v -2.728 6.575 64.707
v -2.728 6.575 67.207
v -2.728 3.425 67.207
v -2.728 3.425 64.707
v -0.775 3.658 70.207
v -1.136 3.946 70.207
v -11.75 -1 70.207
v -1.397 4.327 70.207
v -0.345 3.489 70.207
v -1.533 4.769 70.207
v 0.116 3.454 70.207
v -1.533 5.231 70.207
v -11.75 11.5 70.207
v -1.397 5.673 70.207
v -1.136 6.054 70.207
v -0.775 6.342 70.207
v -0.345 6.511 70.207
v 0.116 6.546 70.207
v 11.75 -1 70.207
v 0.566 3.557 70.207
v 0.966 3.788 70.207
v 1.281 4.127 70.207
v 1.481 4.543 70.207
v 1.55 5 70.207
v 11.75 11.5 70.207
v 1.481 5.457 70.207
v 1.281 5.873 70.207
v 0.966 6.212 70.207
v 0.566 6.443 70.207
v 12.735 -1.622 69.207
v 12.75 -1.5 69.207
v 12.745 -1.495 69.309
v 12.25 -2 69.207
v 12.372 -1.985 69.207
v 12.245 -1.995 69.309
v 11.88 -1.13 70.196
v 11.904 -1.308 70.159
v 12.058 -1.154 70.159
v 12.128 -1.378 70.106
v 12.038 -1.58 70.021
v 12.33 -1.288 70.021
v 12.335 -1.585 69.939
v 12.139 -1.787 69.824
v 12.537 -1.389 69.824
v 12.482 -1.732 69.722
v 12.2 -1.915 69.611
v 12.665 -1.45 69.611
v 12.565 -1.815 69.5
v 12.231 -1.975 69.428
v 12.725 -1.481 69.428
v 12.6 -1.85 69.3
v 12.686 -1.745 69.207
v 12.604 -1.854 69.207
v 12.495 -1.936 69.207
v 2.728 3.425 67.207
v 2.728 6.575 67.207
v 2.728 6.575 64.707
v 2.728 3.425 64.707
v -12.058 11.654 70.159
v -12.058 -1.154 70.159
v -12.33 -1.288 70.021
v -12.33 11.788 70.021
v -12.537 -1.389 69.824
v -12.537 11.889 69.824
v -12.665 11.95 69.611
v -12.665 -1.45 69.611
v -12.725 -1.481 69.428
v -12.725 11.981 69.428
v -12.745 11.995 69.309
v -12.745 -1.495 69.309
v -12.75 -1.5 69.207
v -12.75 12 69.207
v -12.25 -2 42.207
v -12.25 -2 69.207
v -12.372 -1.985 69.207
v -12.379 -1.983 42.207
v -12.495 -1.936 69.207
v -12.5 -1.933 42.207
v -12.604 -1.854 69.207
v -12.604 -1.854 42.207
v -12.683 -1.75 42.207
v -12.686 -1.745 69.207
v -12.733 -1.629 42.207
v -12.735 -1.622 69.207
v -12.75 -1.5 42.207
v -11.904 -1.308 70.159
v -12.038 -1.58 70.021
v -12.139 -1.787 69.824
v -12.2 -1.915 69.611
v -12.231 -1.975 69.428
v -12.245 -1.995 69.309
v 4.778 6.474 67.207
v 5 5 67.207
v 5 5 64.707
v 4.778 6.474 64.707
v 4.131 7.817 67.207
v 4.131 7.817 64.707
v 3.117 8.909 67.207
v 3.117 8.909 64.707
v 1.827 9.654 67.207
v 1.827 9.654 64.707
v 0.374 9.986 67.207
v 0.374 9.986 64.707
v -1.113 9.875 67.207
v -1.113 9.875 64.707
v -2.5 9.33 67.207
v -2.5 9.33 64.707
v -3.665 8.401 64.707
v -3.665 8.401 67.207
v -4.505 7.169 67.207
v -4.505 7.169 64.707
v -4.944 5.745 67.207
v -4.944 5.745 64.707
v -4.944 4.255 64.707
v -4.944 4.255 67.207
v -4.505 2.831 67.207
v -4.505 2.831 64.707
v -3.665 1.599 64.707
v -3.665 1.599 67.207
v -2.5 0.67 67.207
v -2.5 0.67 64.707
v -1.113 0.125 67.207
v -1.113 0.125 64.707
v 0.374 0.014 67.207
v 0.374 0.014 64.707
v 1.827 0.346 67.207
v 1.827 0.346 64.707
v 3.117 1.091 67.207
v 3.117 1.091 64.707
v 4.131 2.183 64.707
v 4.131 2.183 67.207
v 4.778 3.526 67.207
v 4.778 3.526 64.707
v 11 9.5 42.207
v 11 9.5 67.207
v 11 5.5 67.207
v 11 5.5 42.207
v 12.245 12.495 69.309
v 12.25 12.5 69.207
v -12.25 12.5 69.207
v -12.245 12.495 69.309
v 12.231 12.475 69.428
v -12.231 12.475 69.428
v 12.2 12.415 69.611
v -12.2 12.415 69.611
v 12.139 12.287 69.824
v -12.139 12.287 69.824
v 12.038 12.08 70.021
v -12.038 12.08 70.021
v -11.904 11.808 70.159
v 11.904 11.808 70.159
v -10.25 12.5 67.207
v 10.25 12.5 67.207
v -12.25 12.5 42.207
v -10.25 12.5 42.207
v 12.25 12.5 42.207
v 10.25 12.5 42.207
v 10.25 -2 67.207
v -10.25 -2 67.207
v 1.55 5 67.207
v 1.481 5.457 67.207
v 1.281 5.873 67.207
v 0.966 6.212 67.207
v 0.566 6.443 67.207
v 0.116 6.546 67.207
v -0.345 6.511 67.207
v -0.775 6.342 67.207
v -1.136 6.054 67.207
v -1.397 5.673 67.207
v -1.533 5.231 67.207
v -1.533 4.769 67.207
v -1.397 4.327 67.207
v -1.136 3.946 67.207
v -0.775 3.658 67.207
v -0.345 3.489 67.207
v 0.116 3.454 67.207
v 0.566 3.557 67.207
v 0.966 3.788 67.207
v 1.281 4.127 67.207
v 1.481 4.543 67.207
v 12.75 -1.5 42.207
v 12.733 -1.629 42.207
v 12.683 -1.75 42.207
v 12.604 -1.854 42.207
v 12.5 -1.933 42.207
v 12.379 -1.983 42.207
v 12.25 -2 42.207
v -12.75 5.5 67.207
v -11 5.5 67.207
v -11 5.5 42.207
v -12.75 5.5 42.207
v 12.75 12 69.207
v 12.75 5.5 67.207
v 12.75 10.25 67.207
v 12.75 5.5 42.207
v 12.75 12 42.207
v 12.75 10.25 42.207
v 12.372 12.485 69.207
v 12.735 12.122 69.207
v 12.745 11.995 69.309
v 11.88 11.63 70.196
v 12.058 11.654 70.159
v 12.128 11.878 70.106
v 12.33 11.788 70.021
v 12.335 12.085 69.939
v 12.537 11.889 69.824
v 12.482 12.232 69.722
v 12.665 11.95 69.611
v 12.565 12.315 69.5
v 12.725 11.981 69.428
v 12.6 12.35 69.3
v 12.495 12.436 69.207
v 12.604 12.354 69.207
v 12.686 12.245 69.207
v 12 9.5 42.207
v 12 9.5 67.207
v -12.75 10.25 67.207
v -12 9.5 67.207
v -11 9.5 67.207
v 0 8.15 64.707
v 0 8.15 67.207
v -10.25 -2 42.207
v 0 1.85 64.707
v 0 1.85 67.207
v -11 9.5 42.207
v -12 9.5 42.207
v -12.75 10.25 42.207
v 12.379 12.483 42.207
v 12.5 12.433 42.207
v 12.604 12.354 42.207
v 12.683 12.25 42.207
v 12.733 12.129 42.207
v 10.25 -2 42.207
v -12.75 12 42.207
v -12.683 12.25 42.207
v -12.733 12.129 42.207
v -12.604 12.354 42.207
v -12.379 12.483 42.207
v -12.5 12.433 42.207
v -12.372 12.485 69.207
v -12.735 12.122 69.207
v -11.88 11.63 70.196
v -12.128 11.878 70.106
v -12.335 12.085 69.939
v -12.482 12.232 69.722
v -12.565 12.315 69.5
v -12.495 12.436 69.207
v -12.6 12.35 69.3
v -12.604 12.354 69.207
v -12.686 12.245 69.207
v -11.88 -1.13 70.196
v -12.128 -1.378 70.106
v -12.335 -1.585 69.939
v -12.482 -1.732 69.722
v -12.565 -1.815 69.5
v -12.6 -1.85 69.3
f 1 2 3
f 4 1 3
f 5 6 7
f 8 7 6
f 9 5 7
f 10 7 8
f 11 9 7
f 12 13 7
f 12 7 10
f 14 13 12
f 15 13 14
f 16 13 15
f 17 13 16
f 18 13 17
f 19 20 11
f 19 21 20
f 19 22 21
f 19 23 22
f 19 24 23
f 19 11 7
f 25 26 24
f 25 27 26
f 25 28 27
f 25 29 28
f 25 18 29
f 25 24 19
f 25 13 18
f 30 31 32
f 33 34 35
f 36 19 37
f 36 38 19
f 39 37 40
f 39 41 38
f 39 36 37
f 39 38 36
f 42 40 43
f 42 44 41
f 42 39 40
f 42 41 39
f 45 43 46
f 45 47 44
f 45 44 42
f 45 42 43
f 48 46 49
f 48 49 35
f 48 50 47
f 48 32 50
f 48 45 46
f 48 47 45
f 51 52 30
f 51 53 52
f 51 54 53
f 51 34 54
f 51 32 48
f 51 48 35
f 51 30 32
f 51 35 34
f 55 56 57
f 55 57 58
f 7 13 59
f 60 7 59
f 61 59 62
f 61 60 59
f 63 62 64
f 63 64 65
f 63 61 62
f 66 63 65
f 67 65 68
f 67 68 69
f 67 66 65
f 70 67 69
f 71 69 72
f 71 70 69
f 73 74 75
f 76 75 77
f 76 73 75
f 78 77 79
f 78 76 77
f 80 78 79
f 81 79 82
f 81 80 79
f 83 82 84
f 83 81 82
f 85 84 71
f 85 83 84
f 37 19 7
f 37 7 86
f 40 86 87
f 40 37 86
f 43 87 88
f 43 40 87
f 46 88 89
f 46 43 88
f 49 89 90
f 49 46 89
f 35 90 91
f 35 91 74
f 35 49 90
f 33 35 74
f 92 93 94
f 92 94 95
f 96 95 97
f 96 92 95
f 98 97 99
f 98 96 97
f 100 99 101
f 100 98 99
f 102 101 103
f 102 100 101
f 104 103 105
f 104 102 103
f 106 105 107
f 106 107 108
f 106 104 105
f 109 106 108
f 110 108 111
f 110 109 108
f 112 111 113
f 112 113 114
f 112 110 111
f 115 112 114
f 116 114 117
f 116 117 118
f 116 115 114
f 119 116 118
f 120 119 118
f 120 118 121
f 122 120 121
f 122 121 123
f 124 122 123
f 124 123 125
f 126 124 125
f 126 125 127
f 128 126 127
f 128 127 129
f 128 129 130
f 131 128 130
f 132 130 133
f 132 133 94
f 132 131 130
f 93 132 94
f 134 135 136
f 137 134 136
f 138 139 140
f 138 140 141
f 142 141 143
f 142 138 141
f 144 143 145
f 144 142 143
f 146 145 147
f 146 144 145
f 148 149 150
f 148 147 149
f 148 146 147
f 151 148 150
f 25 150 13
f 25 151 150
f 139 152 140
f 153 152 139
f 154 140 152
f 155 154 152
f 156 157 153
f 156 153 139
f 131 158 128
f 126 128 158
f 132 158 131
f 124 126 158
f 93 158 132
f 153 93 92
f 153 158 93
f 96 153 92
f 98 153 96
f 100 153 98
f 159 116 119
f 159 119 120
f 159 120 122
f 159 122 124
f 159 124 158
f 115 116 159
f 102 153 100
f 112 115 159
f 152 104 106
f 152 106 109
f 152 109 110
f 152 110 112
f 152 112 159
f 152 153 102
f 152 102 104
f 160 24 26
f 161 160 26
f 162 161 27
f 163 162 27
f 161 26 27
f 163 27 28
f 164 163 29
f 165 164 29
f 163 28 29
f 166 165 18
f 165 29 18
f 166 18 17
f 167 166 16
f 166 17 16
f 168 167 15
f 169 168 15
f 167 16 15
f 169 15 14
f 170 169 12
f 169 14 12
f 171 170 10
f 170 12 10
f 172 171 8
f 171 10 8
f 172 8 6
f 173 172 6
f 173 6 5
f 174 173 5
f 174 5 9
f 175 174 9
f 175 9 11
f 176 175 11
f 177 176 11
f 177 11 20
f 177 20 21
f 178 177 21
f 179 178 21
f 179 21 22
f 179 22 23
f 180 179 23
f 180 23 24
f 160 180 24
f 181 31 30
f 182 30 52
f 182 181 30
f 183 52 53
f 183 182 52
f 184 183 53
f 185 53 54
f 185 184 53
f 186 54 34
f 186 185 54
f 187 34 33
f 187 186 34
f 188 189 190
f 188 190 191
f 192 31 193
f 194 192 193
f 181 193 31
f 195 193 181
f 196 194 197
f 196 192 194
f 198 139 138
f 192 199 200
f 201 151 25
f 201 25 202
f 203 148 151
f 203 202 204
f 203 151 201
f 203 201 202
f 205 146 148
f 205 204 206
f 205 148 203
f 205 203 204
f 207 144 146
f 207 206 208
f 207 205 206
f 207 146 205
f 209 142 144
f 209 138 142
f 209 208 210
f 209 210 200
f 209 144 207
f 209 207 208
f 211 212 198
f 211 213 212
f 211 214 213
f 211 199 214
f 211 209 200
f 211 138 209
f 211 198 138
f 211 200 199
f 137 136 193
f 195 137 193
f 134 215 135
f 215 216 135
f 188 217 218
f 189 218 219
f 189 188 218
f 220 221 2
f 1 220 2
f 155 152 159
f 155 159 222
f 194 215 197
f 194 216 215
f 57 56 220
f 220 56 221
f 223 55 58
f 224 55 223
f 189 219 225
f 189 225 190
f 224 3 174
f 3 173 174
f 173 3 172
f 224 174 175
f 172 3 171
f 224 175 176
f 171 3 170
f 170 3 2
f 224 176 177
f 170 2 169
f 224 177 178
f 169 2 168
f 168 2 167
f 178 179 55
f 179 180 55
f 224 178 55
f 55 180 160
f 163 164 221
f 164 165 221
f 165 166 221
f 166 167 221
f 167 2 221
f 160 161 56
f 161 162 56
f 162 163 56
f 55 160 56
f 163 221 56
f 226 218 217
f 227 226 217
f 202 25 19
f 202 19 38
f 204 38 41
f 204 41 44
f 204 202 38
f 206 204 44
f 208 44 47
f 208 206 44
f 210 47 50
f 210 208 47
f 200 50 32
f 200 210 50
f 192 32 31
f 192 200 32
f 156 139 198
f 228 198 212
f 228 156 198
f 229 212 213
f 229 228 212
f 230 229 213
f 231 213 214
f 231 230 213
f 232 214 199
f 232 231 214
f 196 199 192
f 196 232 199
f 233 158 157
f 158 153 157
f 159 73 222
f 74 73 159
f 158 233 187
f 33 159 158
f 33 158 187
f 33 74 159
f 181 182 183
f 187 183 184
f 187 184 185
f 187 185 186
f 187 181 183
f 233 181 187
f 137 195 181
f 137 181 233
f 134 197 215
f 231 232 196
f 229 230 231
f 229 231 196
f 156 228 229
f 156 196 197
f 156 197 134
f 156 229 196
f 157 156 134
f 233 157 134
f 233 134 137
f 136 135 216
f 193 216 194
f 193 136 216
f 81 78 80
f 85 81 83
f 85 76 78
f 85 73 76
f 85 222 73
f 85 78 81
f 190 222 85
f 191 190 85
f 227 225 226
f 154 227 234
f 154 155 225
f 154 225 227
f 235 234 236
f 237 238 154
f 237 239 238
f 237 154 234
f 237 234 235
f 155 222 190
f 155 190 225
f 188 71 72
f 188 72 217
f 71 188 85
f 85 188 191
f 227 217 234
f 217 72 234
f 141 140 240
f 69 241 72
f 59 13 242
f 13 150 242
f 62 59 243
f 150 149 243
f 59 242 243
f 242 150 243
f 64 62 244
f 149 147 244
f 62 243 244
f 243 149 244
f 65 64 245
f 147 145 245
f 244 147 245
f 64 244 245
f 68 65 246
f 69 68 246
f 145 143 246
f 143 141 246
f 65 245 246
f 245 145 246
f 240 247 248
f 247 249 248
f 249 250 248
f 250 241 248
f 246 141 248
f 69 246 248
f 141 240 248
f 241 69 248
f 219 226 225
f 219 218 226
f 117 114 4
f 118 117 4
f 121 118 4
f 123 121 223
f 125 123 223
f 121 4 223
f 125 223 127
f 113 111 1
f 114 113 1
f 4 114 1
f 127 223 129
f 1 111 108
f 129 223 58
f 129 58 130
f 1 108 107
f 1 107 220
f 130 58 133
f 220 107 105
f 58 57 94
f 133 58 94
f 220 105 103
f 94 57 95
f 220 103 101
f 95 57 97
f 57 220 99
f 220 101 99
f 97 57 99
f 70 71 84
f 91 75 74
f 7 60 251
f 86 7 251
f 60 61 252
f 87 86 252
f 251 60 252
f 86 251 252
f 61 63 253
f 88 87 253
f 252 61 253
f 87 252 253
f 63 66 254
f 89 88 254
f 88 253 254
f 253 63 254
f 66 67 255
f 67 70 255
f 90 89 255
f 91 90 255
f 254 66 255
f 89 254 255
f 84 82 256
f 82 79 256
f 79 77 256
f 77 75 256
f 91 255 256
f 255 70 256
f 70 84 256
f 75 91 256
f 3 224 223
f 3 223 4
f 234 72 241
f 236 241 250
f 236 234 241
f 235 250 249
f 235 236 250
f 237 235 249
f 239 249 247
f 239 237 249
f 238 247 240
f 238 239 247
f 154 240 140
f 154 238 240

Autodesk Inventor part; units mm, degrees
ref_plane "YZ Plane" through (0, 0, 0) normal (1, 0, 0) x (0, 1, 0)
ref_plane "XZ Plane" through (0, 0, 0) normal (0, 1, 0) x (-1, 0, 0)
ref_plane "XY Plane" through (0, 0, 0) normal (0, 0, 1) x (1, 0, 0)
sketch "Эскиз1" plane through (0, 0, 0) normal (0, 1, 0) x (-1, 0, 0)
  line L0 (0, 56.6418) -> (23.7825, 76.5969) construction
  line L1 (44.1942, 76.014) -> (76.014, 44.1942) construction
  line L2 (91.1, 52.2091) -> (52.2091, 91.1) construction
  line L3 (0, 0) -> (74.2462, 74.2462) construction
  arc A0 (92.5543, 49.5852) -> (48.7014, 93.0224) centre (0, 0) ccw construction
  line L4 (52.2091, 91.1) -> (48.6736, 87.5645) construction
  arc A1 (44.1942, 83.085) -> (44.1942, 76.014) centre (47.7297, 79.5495) ccw construction
  line L5 (52.2091, 91.1) -> (48.6736, 87.5645) construction
  line L6 (48.6736, 87.5645) -> (52.2091, 91.1) construction
  spline S0 degree 2 poles (48.6736, 87.5645) (52.2091, 91.1) (48.7014, 93.0224) knots 1 1 1 2 2 2 construction
  line L7 (52.2091, 91.1) -> (48.7014, 93.0224) construction
  line L8 (52.2091, 91.1) -> (48.7014, 93.0224) construction
  arc A2 (48.7014, 93.0224) -> (44.0271, 95.3237) centre (0, 0) ccw construction
  arc A3 (44.0271, 95.3237) -> (43.577, 95.5303) centre (0, 0) ccw construction
  line L9 (42.6652, 95.941) -> (43.577, 95.5303) construction
  line L10 (42.6652, 95.941) -> (43.577, 95.5303) construction
  spline S1 degree 2 poles (42.0492, 94.5734) (42.6652, 95.941) (43.577, 95.5303) knots 1 1 1 2 2 2 construction
  line L11 (42.0492, 94.5734) -> (42.6652, 95.941) construction
  line L12 (42.6652, 95.941) -> (42.0492, 94.5734) construction
  line L13 (0, 0) -> (0, 209.8821) construction
  spline S2 degree 2 poles (-48.6736, 87.5645) (-52.2091, 91.1) (-48.7014, 93.0224) knots 1 1 1 2 2 2 construction
  line L14 (-48.6736, 87.5645) -> (-52.2091, 91.1) construction
  line L15 (-52.2091, 91.1) -> (-48.7014, 93.0224) construction
  arc A4 (-44.1942, 76.014) -> (-44.1942, 83.085) centre (-47.7297, 79.5495) ccw construction
  line L16 (-44.1942, 76.014) -> (-76.014, 44.1942) construction
  arc A5 (-48.7014, 93.0224) -> (-92.5543, 49.5852) centre (0, 0) ccw construction
  arc A6 (-83.085, 44.1942) -> (-76.014, 44.1942) centre (-79.5495, 47.7297) ccw construction
  line L17 (-83.085, 44.1942) -> (-87.3563, 48.4654) construction
  spline S3 degree 2 poles (-48.6736, -87.5645) (-52.2091, -91.1) (-48.7014, -93.0224) knots 1 1 1 2 2 2 construction
  line L18 (-48.6736, -87.5645) -> (-52.2091, -91.1) construction
  line L19 (-52.2091, -91.1) -> (-48.7014, -93.0224) construction
  circle A7 centre (0, 0) radius 35 construction
  line L20 (-46.3155, -73.8927) -> (-73.8927, -46.3155) construction
  arc A8 (-73.8927, -46.3155) -> (-85.2064, -46.3155) centre (-79.5495, -51.9723) ccw construction
  line L21 (-85.2064, -46.3155) -> (-87.5645, -48.6736) construction
  line L22 (-87.5645, -48.6736) -> (-91.1, -52.2091) construction
  spline S4 degree 2 poles (-87.5645, -48.6736) (-91.1, -52.2091) (-92.5543, -49.5852) knots 1 1 1 2 2 2 construction
  line L23 (-91.1, -52.2091) -> (-92.5543, -49.5852) construction
  arc A9 (-92.5543, -49.5852) -> (-48.7014, -93.0224) centre (0, 0) ccw construction
  arc A10 (-92.5543, 49.5852) -> (-92.5543, -49.5852) centre (0, 0) ccw construction
  line L24 (48.6736, -87.5645) -> (46.3155, -85.2064) construction
  arc A11 (-46.3155, -85.2064) -> (-46.3155, -73.8927) centre (-51.9723, -79.5495) ccw construction
  line L25 (-48.6736, -87.5645) -> (-46.3155, -85.2064) construction
  arc A12 (-48.7014, -93.0224) -> (48.7014, -93.0224) centre (0, 0) ccw construction
  arc A13 (46.3155, -73.8927) -> (46.3155, -85.2064) centre (51.9723, -79.5495) ccw construction
  arc A14 (43.577, 95.5303) -> (-43.577, 95.5303) centre (0, 0) ccw construction
  arc A15 (23.7825, 76.5969) -> (0, 67.941) centre (0, 104.941) ccw construction
  line L26 (0, 56.6418) -> (-35.5516, 86.4744) construction
  line L27 (44.0271, 95.3237) -> (44.0271, 127.8162) construction
  ellipse E0 centre (0, 102.7511) end of major axis (44.0271, 102.7511) minor radius 27.5932 (42.0492, 94.5734) -> (35.2734, 86.2384) ccw construction
  line L28 (42.6652, 95.941) -> (-42.6652, 95.941) construction
  ellipse E1 centre (0, 102.7511) end of major axis (44.5159, 105.2445) minor radius 28.887 (35.2734, 86.2384) -> (42.0492, 94.5734) ccw construction
  line L29 (23.7825, 76.5969) -> (35.2734, 86.2384) construction
  arc A16 (0, 67.941) -> (23.7825, 76.5969) centre (0, 104.941) ccw construction
  arc A17 (-23.7825, 76.5969) -> (0, 67.941) centre (0, 104.941) ccw construction
  line L30 (-23.7825, 76.5969) -> (-35.2734, 86.2384) construction
  line L31 (-42.6652, 95.941) -> (-42.0492, 94.5734) construction
  arc A18 (-43.577, 95.5303) -> (-48.7014, 93.0224) centre (0, 0) ccw construction
  line L32 (-42.6652, 95.941) -> (-43.577, 95.5303) construction
  spline S5 degree 2 poles (-42.0492, 94.5734) (-42.6652, 95.941) (-43.577, 95.5303) knots 1 1 1 2 2 2 construction
  line L33 (-42.0492, 94.5734) -> (-42.6652, 95.941) construction
  line L34 (-42.6652, 95.941) -> (-43.577, 95.5303) construction
  line L35 (-42.6652, 95.941) -> (-43.577, 95.5303) construction
  spline S6 degree 2 poles (-42.0492, 94.5734) (-42.6652, 95.941) (-43.577, 95.5303) knots 1 1 1 2 2 2 construction
  line L36 (-42.0492, 94.5734) -> (-42.6652, 95.941) construction
  ellipse E2 centre (0, 102.7511) end of major axis (-44.5159, 105.2445) minor radius 28.887 (-42.0492, 94.5734) -> (-35.2734, 86.2384) ccw construction
  line L37 (83.085, 44.1942) -> (87.5645, 48.6736) construction
  arc A19 (76.014, 44.1942) -> (83.085, 44.1942) centre (79.5495, 47.7297) ccw construction
  spline S7 degree 2 poles (48.6736, -87.5645) (52.2091, -91.1) (48.7014, -93.0224) knots 1 1 1 2 2 2 construction
  line L38 (48.6736, -87.5645) -> (52.2091, -91.1) construction
  line L39 (52.2091, -91.1) -> (48.7014, -93.0224) construction
  line L40 (46.3155, -73.8927) -> (73.8927, -46.3155) construction
  arc A20 (85.2064, -46.3155) -> (73.8927, -46.3155) centre (79.5495, -51.9723) ccw construction
  line L41 (85.2064, -46.3155) -> (87.5645, -48.6736) construction
  spline S8 degree 2 poles (87.5645, -48.6736) (91.1, -52.2091) (92.5543, -49.5852) knots 1 1 1 2 2 2 construction
  line L42 (87.5645, -48.6736) -> (91.1, -52.2091) construction
  line L43 (91.1, -52.2091) -> (92.5543, -49.5852) construction
  arc A21 (92.5543, -49.5852) -> (92.5543, 49.5852) centre (0, 0) ccw construction
  arc A22 (48.7014, -93.0224) -> (92.5543, -49.5852) centre (0, 0) ccw construction
  arc A23 (28.5452, 71.4571) -> (-28.5452, 71.4571) centre (0, 104.941) ccw construction
  line L44 (-83.085, 34.2947) -> (-90.6891, 41.8987) construction
  line L45 (-93.5297, 47.6709) -> (-92.5543, 49.5852) construction
  line L46 (-29.1816, 81.127) -> (-76.014, 34.2947) construction
  arc A24 (-83.085, 34.2947) -> (-76.014, 34.2947) centre (-79.5495, 37.8302) ccw construction
  line L47 (-34.1491, 76.1596) -> (-28.5452, 71.4571) construction
  arc A25 (-30.6393, 73.2144) -> (-37.3889, 72.9198) centre (-33.8534, 69.3842) ccw construction
  arc A26 (-90.6891, 41.8987) -> (-87.3563, 48.4654) centre (0, 0) ccw construction
  arc A27 (37.3889, 72.9198) -> (30.6393, 73.2144) centre (33.8534, 69.3842) ccw construction
  line L48 (29.1816, 81.127) -> (76.014, 34.2947) construction
  arc A28 (76.014, 34.2947) -> (83.085, 34.2947) centre (79.5495, 37.8302) ccw construction
  line L49 (83.085, 34.2947) -> (90.6891, 41.8987) construction
  arc A29 (76.014, 44.1942) -> (83.085, 44.1942) centre (79.5495, 47.7297) ccw construction
  line L50 (44.1942, 76.014) -> (76.014, 44.1942) construction
  arc A30 (44.1942, 83.085) -> (44.1942, 76.014) centre (47.7297, 79.5495) ccw construction
  arc A31 (5.5413, 61.2914) -> (28.5452, 71.4571) centre (0, 104.941) ccw
  arc A32 (-28.5452, 71.4571) -> (5.5413, 61.2914) centre (0, 104.941) ccw
  line L51 (34.1491, 76.1596) -> (28.5452, 71.4571) construction
  arc A33 (-87.3563, 48.4654) -> (-90.6891, 41.8987) centre (0, 0) ccw construction
  line L52 (83.085, 44.1942) -> (87.3563, 48.4654) construction
  arc A34 (90.6891, 41.8987) -> (87.3563, 48.4654) centre (0, 0) ccw construction
  line L53 (-44.1942, 83.085) -> (-48.6736, 87.5645) construction
  line L54 (44.0271, 95.3237) -> (43.577, 95.5303) construction
  line L55 (48.6736, 87.5645) -> (44.1942, 83.085) construction
  line L56 (0, 104.941) -> (-23.6028, 54.3247) construction
  circle A35 centre (31.1916, 76.2887) radius 2 construction
  line L57 (29.1816, 81.127) -> (23.7825, 76.5969)
  line L58 (29.1816, 81.127) -> (34.1491, 76.1596)
  line L59 (34.1491, 76.1596) -> (28.5452, 71.4571)
  line L60 (-28.5452, 71.4571) -> (-34.1491, 76.1596)
  line L61 (-23.7825, 76.5969) -> (-29.1816, 81.127)
  line L62 (-29.1816, 81.127) -> (-34.1491, 76.1596)
  arc A36 (-26.6462, 78.9996) -> (-31.2232, 73.7044) centre (-28.9734, 76.3855) ccw
  arc A37 (31.2232, 73.7044) -> (26.6462, 78.9996) centre (28.9734, 76.3855) ccw
  line L63 (12.75, 58.0269) -> (-12.75, 58.0269)
  line L64 (0, 67.941) -> (0, 64.941) construction
  line L65 (-12.75, 58.0269) -> (-12.75, 67.2072) construction
  line L66 (12.75, 58.0269) -> (12.75, 67.2072) construction
  arc A38 (-12.75, 67.2072) -> (12.75, 67.2072) centre (0, 101.941) ccw
  line L67 (12.75, 67.2072) -> (12.75, 70.2072)
  line L68 (-12.75, 70.2072) -> (-12.75, 70.2072) construction
  line L69 (-12.75, 67.2072) -> (-12.75, 70.2072)
  line L70 (10.1, 59.4125) -> (-10.1, 59.4125) construction
  line L71 (12.75, 70.2072) -> (-12.75, 70.2072)
  line L72 (12.75, 67.2072) -> (-12.75, 67.2072)
  point P0 (60.1041, 60.1041)
  point P1 (40.6586, 79.5495)
  point P2 (79.5495, 40.6586)
  point P3 (0, 105)
  point P4 (-87.5645, 48.6736)
  point P5 (-23.542, 76.3968)
  point P6 (-34.9935, 86.0061)
  point P7 (0, 95.941)
  point P8 (-94.5192, 45.7288)
  point P9 (-13.2817, 58.6489)
  point P10 (-28.5452, 71.4571)
  point P11 (13.2817, 58.6489)
  point P12 (-15.6369, 71.4076)
  point P13 (-26.8032, 79.1314)
  point P14 (-31.2232, 73.7044)
  point P15 (26.8032, 79.1314)
  dimension "d67" = 44.5856
  dimension "d48" = 74
  dimension "d49" = 100
  dimension "d50" = 28
  dimension "d51" = 15
  dimension "d52" = 45
  dimension "d53" = 55
  dimension "d54" = 16.3348
  dimension "d55" = 27.5
  dimension "d56" = 5
  dimension "d57" = 5
  dimension "d58" = 1
  dimension "d59" = 1.5
  dimension "d60" = 1.5
  dimension "d61" = 1
  dimension "d62" = 4
  dimension "d63" = 70
  dimension "d64" = 85
  dimension "d65" = 105
  dimension "d66" = 1.3619
  dimension "d68" = 88
  dimension "d69" = 7
  dimension "d70" = 5
  dimension "d71" = 7
  dimension "d72" = 5
  dimension "d73" = 7
  dimension "d74" = 5
  dimension "d75" = 5.1
  dimension "d78" = 4
  dimension "d166" = 25.5
  dimension "d169" = 3
  dimension "d171" = 3
  dimension "d172" = 3
  dimension "d173" = 20.2
extrude "Выдавливание7" add sketch "Эскиз1" along normal blind 14 contours L69 L71 L67 L72
sketch "Эскиз10" plane through (12.75, 0, 67.2072) normal (0, 0, -1) x (-1, 0, 0)
  line L0 (25.5, 0) -> (0, 0) construction
  line L1 (0, 0) -> (0, 14) construction
  line L2 (25.5, 14) -> (0, 14) construction
  line L3 (25.5, 0) -> (25.5, 14) construction
  line L4 (25.5, 14) -> (0, 14) construction
  line L5 (12.75, 14) -> (12.75, 0) construction
  line L6 (-0.25, 15.8948) -> (-0.25, -2.2577) construction
  line L7 (0, 14) -> (2.5, 14)
  line L8 (2.5, 14) -> (2.5, 0)
  line L9 (2.5, 0) -> (0, 0)
  line L10 (0, 0) -> (0, 14)
  line L11 (0, 9) -> (2.5, 9) construction
  line L12 (0, 0) -> (0, 14) construction
  line L13 (0, 9.5) -> (1.75, 9.5)
  line L14 (1.75, 9.5) -> (1.75, 5.5)
  line L15 (1.75, 5.5) -> (0, 5.5)
  line L16 (0, 5.5) -> (0, 9.5) construction
  line L17 (0, 9) -> (1.25, 9) construction
  line L18 (1.25, 9) -> (1.25, 6) construction
  line L19 (1.25, 6) -> (0, 6) construction
  line L20 (0, 6) -> (0, 9) construction
  line L21 (1.25, 9) -> (0, 10.25)
  line L22 (25.5, 0) -> (25.5, 14) construction
  line L23 (25.5, 14) -> (23, 14)
  line L24 (23, 14) -> (23, 0)
  line L25 (23, 0) -> (25.5, 0)
  line L26 (25.5, 0) -> (25.5, 14)
  line L27 (25.5, 9) -> (23, 9) construction
  line L28 (25.5, 0) -> (25.5, 14) construction
  line L29 (25.5, 9.5) -> (23.75, 9.5)
  line L30 (23.75, 9.5) -> (23.75, 5.5)
  line L31 (23.75, 5.5) -> (25.5, 5.5)
  line L32 (25.5, 5.5) -> (25.5, 9.5) construction
  line L33 (25.5, 9) -> (24.25, 9) construction
  line L34 (24.25, 9) -> (24.25, 6) construction
  line L35 (24.25, 6) -> (25.5, 6) construction
  line L36 (25.5, 6) -> (25.5, 9) construction
  line L37 (24.25, 9) -> (25.5, 10.25)
  point P0 (24.75, 9.5)
  point P1 (0, 5.5)
  point P2 (0, 10.25)
  point P3 (0.75, 9.5)
  dimension "d215" = 26
  dimension "d216" = 20.5
  dimension "d218" = 3
  dimension "d219" = 1.5
  dimension "d220" = 0.5
  dimension "d221" = 0.5
  dimension "d222" = 0.5
  dimension "d223" = 135
  dimension "d237" = 5.5
extrude "Выдавливание16" add sketch "Эскиз10" along normal blind 25 contours L7 L8 L9 L10 L15 L14 L13 L21 | L26 L37 L29 L30 L31 L25 L24 L23
sketch "Эскиз12" plane through (-12.75, 0, 70.2072) normal (0, 0, 1) x (1, 0, 0)
  line L0 (0, 14) -> (2.5, 14) construction
  line L1 (2.5, 14) -> (2.5, 0) construction
  line L2 (2.5, 0) -> (0, 0) construction
  line L3 (0, 0) -> (0, 5.5) construction
  line L4 (0, 5.5) -> (1.75, 5.5) construction
  line L5 (1.75, 5.5) -> (1.75, 9.5) construction
  line L6 (1.75, 9.5) -> (0.75, 9.5) construction
  line L7 (0.75, 9.5) -> (0, 10.25) construction
  line L8 (0, 10.25) -> (0, 14) construction
  line L9 (0, 0) -> (25.5, 0) construction
  line L10 (25.5, 0) -> (25.5, 14) construction
  line L11 (0, 14) -> (25.5, 14) construction
  line L12 (0, 0) -> (0, 14) construction
  line L13 (25.5, 14) -> (25.5, 10.25) construction
  line L14 (25.5, 10.25) -> (24.75, 9.5) construction
  line L15 (24.75, 9.5) -> (23.75, 9.5) construction
  line L16 (23.75, 9.5) -> (23.75, 5.5) construction
  line L17 (23.75, 5.5) -> (25.5, 5.5) construction
  line L18 (25.5, 5.5) -> (25.5, 0) construction
  line L19 (25.5, 0) -> (23, 0) construction
  line L20 (23, 0) -> (23, 14) construction
  line L21 (23, 14) -> (25.5, 14) construction
  line L22 (23, 0) -> (23, 14) construction
  line L23 (0, 14) -> (25.5, 14) construction
  line L24 (23, 14) -> (25.5, 14) construction
  line L25 (23, 14) -> (2.5, 14) construction
  line L26 (0, 14) -> (2.5, 14) construction
  line L27 (25.5, 0) -> (25.5, 14) construction
  line L28 (25.5, 5.5) -> (25.5, 10.25) construction
  line L29 (0, 0) -> (0, 14) construction
  line L30 (0, 14) -> (25.5, 14) construction
  line L31 (12.75, 14) -> (12.75, 0) construction
  circle A0 centre (12.75, 5) radius 3.15
  circle A1 centre (12.75, 5) radius 1.55
  line L32 (12.75, 5) -> (15.478, 6.575) construction
  line L33 (12.75, 5) -> (10.022, 6.575) construction
  line L34 (12.75, 5) -> (15.9, 5) construction
  line L35 (12.75, 5) -> (15.478, 3.425) construction
  line L36 (12.75, 5) -> (10.022, 3.425) construction
  line L37 (15.478, 6.575) -> (12.75, 8.15)
  line L38 (12.75, 8.15) -> (10.022, 6.575)
  line L39 (10.022, 6.575) -> (10.022, 3.425)
  line L40 (15.478, 6.575) -> (15.478, 3.425)
  line L41 (15.478, 3.425) -> (12.75, 1.85)
  line L42 (12.75, 1.85) -> (10.022, 3.425)
  circle A2 centre (12.75, 5) radius 5
  point P0 (15.478, 3.425)
  point P1 (15.478, 3.425)
  point P2 (12.75, 1.85)
  point P3 (10.022, 3.425)
  point P4 (10.022, 3.425)
  point P5 (10.022, 6.575)
  point P6 (10.022, 6.575)
  dimension "d226" = 6.3
  dimension "d229" = 3.1
  dimension "d238" = 5
  dimension "d239" = 60
  dimension "d244" = 10
extrude "Выдавливание17" [suppressed]
extrude "Выдавливание18" cut sketch "Эскиз12" against normal blind 5.5 contours A1
extrude "Выдавливание19" cut sketch "Эскиз12" against normal blind 5.5 contours L40 L41 L42 L39 L38 L37
fillet "Сопряжение1" [suppressed]
sketch "Эскиз14" plane through (0, 0, 0) normal (0, -1, 0) x (1, 0, 0)
  line L0 (-12.75, 70.2072) -> (12.75, 70.2072) projected
  line L1 (-12.75, 70.2072) -> (-12.75, 42.2072) projected
  line L2 (-10.25, 42.2072) -> (-12.75, 42.2072) projected
  line L3 (-10.25, 67.2072) -> (-10.25, 42.2072) projected
  line L4 (10.25, 67.2072) -> (-10.25, 67.2072) projected
  line L5 (10.25, 67.2072) -> (10.25, 42.2072) projected
  line L6 (12.75, 42.2072) -> (10.25, 42.2072) projected
  line L7 (12.75, 70.2072) -> (12.75, 42.2072) projected
  point P0 (0, 0)
extrude "Выдавливание20" add sketch "Эскиз14" along normal blind 2
fillet "Сопряжение2" [suppressed]
extrude "Выдавливание21" add sketch "Эскиз12" against normal blind 5.5 contours A2
extrude "Выдавливание22" add sketch "Эскиз12" against normal blind 3 contours L40 L41 L42 L39 L38 L37
extrude "Выдавливание23" add sketch "Эскиз12" against normal blind 5.5 contours A0 L40 | L37 A0 | A0 L41 | L38 A0 | A0 L42 | L39 A0
sketch "Эскиз16" plane through (0, 14, 0) normal (0, 1, 0) x (1, 0, 0)
  line L0 (-12.75, -70.2072) -> (12.75, -70.2072) projected
  line L1 (12.75, -70.2072) -> (12.75, -42.2072) projected
  line L2 (10.25, -42.2072) -> (12.75, -42.2072) projected
  line L3 (10.25, -67.2072) -> (10.25, -42.2072) projected
  line L4 (10.25, -67.2072) -> (-10.25, -67.2072) projected
  line L5 (-10.25, -67.2072) -> (-10.25, -42.2072) projected
  line L6 (-12.75, -42.2072) -> (-10.25, -42.2072) projected
  line L7 (-12.75, -70.2072) -> (-12.75, -42.2072) projected
  point P0 (0, 0)
extrude "Выдавливание24" cut sketch "Эскиз16" against normal blind 1.5
fillet "Сопряжение3" radius 1 4 edges at (0, 12.5, 70.2072) (12.75, 5.25, 70.2072) (0, -2, 70.2072) (-12.75, 5.25, 70.2072)
fillet "Сопряжение4" radius 0.5 6 edges at (-12.4571, 12.2071, 69.9143) (-12.4571, -1.7071, 69.9143) (-12.75, -2, 55.7072) (12.4571, -1.7071, 69.9143) (12.75, -2, 55.7072) (12.4571, 12.2071, 69.9143)
properties part number "_3DПЕЧАТЬ"
